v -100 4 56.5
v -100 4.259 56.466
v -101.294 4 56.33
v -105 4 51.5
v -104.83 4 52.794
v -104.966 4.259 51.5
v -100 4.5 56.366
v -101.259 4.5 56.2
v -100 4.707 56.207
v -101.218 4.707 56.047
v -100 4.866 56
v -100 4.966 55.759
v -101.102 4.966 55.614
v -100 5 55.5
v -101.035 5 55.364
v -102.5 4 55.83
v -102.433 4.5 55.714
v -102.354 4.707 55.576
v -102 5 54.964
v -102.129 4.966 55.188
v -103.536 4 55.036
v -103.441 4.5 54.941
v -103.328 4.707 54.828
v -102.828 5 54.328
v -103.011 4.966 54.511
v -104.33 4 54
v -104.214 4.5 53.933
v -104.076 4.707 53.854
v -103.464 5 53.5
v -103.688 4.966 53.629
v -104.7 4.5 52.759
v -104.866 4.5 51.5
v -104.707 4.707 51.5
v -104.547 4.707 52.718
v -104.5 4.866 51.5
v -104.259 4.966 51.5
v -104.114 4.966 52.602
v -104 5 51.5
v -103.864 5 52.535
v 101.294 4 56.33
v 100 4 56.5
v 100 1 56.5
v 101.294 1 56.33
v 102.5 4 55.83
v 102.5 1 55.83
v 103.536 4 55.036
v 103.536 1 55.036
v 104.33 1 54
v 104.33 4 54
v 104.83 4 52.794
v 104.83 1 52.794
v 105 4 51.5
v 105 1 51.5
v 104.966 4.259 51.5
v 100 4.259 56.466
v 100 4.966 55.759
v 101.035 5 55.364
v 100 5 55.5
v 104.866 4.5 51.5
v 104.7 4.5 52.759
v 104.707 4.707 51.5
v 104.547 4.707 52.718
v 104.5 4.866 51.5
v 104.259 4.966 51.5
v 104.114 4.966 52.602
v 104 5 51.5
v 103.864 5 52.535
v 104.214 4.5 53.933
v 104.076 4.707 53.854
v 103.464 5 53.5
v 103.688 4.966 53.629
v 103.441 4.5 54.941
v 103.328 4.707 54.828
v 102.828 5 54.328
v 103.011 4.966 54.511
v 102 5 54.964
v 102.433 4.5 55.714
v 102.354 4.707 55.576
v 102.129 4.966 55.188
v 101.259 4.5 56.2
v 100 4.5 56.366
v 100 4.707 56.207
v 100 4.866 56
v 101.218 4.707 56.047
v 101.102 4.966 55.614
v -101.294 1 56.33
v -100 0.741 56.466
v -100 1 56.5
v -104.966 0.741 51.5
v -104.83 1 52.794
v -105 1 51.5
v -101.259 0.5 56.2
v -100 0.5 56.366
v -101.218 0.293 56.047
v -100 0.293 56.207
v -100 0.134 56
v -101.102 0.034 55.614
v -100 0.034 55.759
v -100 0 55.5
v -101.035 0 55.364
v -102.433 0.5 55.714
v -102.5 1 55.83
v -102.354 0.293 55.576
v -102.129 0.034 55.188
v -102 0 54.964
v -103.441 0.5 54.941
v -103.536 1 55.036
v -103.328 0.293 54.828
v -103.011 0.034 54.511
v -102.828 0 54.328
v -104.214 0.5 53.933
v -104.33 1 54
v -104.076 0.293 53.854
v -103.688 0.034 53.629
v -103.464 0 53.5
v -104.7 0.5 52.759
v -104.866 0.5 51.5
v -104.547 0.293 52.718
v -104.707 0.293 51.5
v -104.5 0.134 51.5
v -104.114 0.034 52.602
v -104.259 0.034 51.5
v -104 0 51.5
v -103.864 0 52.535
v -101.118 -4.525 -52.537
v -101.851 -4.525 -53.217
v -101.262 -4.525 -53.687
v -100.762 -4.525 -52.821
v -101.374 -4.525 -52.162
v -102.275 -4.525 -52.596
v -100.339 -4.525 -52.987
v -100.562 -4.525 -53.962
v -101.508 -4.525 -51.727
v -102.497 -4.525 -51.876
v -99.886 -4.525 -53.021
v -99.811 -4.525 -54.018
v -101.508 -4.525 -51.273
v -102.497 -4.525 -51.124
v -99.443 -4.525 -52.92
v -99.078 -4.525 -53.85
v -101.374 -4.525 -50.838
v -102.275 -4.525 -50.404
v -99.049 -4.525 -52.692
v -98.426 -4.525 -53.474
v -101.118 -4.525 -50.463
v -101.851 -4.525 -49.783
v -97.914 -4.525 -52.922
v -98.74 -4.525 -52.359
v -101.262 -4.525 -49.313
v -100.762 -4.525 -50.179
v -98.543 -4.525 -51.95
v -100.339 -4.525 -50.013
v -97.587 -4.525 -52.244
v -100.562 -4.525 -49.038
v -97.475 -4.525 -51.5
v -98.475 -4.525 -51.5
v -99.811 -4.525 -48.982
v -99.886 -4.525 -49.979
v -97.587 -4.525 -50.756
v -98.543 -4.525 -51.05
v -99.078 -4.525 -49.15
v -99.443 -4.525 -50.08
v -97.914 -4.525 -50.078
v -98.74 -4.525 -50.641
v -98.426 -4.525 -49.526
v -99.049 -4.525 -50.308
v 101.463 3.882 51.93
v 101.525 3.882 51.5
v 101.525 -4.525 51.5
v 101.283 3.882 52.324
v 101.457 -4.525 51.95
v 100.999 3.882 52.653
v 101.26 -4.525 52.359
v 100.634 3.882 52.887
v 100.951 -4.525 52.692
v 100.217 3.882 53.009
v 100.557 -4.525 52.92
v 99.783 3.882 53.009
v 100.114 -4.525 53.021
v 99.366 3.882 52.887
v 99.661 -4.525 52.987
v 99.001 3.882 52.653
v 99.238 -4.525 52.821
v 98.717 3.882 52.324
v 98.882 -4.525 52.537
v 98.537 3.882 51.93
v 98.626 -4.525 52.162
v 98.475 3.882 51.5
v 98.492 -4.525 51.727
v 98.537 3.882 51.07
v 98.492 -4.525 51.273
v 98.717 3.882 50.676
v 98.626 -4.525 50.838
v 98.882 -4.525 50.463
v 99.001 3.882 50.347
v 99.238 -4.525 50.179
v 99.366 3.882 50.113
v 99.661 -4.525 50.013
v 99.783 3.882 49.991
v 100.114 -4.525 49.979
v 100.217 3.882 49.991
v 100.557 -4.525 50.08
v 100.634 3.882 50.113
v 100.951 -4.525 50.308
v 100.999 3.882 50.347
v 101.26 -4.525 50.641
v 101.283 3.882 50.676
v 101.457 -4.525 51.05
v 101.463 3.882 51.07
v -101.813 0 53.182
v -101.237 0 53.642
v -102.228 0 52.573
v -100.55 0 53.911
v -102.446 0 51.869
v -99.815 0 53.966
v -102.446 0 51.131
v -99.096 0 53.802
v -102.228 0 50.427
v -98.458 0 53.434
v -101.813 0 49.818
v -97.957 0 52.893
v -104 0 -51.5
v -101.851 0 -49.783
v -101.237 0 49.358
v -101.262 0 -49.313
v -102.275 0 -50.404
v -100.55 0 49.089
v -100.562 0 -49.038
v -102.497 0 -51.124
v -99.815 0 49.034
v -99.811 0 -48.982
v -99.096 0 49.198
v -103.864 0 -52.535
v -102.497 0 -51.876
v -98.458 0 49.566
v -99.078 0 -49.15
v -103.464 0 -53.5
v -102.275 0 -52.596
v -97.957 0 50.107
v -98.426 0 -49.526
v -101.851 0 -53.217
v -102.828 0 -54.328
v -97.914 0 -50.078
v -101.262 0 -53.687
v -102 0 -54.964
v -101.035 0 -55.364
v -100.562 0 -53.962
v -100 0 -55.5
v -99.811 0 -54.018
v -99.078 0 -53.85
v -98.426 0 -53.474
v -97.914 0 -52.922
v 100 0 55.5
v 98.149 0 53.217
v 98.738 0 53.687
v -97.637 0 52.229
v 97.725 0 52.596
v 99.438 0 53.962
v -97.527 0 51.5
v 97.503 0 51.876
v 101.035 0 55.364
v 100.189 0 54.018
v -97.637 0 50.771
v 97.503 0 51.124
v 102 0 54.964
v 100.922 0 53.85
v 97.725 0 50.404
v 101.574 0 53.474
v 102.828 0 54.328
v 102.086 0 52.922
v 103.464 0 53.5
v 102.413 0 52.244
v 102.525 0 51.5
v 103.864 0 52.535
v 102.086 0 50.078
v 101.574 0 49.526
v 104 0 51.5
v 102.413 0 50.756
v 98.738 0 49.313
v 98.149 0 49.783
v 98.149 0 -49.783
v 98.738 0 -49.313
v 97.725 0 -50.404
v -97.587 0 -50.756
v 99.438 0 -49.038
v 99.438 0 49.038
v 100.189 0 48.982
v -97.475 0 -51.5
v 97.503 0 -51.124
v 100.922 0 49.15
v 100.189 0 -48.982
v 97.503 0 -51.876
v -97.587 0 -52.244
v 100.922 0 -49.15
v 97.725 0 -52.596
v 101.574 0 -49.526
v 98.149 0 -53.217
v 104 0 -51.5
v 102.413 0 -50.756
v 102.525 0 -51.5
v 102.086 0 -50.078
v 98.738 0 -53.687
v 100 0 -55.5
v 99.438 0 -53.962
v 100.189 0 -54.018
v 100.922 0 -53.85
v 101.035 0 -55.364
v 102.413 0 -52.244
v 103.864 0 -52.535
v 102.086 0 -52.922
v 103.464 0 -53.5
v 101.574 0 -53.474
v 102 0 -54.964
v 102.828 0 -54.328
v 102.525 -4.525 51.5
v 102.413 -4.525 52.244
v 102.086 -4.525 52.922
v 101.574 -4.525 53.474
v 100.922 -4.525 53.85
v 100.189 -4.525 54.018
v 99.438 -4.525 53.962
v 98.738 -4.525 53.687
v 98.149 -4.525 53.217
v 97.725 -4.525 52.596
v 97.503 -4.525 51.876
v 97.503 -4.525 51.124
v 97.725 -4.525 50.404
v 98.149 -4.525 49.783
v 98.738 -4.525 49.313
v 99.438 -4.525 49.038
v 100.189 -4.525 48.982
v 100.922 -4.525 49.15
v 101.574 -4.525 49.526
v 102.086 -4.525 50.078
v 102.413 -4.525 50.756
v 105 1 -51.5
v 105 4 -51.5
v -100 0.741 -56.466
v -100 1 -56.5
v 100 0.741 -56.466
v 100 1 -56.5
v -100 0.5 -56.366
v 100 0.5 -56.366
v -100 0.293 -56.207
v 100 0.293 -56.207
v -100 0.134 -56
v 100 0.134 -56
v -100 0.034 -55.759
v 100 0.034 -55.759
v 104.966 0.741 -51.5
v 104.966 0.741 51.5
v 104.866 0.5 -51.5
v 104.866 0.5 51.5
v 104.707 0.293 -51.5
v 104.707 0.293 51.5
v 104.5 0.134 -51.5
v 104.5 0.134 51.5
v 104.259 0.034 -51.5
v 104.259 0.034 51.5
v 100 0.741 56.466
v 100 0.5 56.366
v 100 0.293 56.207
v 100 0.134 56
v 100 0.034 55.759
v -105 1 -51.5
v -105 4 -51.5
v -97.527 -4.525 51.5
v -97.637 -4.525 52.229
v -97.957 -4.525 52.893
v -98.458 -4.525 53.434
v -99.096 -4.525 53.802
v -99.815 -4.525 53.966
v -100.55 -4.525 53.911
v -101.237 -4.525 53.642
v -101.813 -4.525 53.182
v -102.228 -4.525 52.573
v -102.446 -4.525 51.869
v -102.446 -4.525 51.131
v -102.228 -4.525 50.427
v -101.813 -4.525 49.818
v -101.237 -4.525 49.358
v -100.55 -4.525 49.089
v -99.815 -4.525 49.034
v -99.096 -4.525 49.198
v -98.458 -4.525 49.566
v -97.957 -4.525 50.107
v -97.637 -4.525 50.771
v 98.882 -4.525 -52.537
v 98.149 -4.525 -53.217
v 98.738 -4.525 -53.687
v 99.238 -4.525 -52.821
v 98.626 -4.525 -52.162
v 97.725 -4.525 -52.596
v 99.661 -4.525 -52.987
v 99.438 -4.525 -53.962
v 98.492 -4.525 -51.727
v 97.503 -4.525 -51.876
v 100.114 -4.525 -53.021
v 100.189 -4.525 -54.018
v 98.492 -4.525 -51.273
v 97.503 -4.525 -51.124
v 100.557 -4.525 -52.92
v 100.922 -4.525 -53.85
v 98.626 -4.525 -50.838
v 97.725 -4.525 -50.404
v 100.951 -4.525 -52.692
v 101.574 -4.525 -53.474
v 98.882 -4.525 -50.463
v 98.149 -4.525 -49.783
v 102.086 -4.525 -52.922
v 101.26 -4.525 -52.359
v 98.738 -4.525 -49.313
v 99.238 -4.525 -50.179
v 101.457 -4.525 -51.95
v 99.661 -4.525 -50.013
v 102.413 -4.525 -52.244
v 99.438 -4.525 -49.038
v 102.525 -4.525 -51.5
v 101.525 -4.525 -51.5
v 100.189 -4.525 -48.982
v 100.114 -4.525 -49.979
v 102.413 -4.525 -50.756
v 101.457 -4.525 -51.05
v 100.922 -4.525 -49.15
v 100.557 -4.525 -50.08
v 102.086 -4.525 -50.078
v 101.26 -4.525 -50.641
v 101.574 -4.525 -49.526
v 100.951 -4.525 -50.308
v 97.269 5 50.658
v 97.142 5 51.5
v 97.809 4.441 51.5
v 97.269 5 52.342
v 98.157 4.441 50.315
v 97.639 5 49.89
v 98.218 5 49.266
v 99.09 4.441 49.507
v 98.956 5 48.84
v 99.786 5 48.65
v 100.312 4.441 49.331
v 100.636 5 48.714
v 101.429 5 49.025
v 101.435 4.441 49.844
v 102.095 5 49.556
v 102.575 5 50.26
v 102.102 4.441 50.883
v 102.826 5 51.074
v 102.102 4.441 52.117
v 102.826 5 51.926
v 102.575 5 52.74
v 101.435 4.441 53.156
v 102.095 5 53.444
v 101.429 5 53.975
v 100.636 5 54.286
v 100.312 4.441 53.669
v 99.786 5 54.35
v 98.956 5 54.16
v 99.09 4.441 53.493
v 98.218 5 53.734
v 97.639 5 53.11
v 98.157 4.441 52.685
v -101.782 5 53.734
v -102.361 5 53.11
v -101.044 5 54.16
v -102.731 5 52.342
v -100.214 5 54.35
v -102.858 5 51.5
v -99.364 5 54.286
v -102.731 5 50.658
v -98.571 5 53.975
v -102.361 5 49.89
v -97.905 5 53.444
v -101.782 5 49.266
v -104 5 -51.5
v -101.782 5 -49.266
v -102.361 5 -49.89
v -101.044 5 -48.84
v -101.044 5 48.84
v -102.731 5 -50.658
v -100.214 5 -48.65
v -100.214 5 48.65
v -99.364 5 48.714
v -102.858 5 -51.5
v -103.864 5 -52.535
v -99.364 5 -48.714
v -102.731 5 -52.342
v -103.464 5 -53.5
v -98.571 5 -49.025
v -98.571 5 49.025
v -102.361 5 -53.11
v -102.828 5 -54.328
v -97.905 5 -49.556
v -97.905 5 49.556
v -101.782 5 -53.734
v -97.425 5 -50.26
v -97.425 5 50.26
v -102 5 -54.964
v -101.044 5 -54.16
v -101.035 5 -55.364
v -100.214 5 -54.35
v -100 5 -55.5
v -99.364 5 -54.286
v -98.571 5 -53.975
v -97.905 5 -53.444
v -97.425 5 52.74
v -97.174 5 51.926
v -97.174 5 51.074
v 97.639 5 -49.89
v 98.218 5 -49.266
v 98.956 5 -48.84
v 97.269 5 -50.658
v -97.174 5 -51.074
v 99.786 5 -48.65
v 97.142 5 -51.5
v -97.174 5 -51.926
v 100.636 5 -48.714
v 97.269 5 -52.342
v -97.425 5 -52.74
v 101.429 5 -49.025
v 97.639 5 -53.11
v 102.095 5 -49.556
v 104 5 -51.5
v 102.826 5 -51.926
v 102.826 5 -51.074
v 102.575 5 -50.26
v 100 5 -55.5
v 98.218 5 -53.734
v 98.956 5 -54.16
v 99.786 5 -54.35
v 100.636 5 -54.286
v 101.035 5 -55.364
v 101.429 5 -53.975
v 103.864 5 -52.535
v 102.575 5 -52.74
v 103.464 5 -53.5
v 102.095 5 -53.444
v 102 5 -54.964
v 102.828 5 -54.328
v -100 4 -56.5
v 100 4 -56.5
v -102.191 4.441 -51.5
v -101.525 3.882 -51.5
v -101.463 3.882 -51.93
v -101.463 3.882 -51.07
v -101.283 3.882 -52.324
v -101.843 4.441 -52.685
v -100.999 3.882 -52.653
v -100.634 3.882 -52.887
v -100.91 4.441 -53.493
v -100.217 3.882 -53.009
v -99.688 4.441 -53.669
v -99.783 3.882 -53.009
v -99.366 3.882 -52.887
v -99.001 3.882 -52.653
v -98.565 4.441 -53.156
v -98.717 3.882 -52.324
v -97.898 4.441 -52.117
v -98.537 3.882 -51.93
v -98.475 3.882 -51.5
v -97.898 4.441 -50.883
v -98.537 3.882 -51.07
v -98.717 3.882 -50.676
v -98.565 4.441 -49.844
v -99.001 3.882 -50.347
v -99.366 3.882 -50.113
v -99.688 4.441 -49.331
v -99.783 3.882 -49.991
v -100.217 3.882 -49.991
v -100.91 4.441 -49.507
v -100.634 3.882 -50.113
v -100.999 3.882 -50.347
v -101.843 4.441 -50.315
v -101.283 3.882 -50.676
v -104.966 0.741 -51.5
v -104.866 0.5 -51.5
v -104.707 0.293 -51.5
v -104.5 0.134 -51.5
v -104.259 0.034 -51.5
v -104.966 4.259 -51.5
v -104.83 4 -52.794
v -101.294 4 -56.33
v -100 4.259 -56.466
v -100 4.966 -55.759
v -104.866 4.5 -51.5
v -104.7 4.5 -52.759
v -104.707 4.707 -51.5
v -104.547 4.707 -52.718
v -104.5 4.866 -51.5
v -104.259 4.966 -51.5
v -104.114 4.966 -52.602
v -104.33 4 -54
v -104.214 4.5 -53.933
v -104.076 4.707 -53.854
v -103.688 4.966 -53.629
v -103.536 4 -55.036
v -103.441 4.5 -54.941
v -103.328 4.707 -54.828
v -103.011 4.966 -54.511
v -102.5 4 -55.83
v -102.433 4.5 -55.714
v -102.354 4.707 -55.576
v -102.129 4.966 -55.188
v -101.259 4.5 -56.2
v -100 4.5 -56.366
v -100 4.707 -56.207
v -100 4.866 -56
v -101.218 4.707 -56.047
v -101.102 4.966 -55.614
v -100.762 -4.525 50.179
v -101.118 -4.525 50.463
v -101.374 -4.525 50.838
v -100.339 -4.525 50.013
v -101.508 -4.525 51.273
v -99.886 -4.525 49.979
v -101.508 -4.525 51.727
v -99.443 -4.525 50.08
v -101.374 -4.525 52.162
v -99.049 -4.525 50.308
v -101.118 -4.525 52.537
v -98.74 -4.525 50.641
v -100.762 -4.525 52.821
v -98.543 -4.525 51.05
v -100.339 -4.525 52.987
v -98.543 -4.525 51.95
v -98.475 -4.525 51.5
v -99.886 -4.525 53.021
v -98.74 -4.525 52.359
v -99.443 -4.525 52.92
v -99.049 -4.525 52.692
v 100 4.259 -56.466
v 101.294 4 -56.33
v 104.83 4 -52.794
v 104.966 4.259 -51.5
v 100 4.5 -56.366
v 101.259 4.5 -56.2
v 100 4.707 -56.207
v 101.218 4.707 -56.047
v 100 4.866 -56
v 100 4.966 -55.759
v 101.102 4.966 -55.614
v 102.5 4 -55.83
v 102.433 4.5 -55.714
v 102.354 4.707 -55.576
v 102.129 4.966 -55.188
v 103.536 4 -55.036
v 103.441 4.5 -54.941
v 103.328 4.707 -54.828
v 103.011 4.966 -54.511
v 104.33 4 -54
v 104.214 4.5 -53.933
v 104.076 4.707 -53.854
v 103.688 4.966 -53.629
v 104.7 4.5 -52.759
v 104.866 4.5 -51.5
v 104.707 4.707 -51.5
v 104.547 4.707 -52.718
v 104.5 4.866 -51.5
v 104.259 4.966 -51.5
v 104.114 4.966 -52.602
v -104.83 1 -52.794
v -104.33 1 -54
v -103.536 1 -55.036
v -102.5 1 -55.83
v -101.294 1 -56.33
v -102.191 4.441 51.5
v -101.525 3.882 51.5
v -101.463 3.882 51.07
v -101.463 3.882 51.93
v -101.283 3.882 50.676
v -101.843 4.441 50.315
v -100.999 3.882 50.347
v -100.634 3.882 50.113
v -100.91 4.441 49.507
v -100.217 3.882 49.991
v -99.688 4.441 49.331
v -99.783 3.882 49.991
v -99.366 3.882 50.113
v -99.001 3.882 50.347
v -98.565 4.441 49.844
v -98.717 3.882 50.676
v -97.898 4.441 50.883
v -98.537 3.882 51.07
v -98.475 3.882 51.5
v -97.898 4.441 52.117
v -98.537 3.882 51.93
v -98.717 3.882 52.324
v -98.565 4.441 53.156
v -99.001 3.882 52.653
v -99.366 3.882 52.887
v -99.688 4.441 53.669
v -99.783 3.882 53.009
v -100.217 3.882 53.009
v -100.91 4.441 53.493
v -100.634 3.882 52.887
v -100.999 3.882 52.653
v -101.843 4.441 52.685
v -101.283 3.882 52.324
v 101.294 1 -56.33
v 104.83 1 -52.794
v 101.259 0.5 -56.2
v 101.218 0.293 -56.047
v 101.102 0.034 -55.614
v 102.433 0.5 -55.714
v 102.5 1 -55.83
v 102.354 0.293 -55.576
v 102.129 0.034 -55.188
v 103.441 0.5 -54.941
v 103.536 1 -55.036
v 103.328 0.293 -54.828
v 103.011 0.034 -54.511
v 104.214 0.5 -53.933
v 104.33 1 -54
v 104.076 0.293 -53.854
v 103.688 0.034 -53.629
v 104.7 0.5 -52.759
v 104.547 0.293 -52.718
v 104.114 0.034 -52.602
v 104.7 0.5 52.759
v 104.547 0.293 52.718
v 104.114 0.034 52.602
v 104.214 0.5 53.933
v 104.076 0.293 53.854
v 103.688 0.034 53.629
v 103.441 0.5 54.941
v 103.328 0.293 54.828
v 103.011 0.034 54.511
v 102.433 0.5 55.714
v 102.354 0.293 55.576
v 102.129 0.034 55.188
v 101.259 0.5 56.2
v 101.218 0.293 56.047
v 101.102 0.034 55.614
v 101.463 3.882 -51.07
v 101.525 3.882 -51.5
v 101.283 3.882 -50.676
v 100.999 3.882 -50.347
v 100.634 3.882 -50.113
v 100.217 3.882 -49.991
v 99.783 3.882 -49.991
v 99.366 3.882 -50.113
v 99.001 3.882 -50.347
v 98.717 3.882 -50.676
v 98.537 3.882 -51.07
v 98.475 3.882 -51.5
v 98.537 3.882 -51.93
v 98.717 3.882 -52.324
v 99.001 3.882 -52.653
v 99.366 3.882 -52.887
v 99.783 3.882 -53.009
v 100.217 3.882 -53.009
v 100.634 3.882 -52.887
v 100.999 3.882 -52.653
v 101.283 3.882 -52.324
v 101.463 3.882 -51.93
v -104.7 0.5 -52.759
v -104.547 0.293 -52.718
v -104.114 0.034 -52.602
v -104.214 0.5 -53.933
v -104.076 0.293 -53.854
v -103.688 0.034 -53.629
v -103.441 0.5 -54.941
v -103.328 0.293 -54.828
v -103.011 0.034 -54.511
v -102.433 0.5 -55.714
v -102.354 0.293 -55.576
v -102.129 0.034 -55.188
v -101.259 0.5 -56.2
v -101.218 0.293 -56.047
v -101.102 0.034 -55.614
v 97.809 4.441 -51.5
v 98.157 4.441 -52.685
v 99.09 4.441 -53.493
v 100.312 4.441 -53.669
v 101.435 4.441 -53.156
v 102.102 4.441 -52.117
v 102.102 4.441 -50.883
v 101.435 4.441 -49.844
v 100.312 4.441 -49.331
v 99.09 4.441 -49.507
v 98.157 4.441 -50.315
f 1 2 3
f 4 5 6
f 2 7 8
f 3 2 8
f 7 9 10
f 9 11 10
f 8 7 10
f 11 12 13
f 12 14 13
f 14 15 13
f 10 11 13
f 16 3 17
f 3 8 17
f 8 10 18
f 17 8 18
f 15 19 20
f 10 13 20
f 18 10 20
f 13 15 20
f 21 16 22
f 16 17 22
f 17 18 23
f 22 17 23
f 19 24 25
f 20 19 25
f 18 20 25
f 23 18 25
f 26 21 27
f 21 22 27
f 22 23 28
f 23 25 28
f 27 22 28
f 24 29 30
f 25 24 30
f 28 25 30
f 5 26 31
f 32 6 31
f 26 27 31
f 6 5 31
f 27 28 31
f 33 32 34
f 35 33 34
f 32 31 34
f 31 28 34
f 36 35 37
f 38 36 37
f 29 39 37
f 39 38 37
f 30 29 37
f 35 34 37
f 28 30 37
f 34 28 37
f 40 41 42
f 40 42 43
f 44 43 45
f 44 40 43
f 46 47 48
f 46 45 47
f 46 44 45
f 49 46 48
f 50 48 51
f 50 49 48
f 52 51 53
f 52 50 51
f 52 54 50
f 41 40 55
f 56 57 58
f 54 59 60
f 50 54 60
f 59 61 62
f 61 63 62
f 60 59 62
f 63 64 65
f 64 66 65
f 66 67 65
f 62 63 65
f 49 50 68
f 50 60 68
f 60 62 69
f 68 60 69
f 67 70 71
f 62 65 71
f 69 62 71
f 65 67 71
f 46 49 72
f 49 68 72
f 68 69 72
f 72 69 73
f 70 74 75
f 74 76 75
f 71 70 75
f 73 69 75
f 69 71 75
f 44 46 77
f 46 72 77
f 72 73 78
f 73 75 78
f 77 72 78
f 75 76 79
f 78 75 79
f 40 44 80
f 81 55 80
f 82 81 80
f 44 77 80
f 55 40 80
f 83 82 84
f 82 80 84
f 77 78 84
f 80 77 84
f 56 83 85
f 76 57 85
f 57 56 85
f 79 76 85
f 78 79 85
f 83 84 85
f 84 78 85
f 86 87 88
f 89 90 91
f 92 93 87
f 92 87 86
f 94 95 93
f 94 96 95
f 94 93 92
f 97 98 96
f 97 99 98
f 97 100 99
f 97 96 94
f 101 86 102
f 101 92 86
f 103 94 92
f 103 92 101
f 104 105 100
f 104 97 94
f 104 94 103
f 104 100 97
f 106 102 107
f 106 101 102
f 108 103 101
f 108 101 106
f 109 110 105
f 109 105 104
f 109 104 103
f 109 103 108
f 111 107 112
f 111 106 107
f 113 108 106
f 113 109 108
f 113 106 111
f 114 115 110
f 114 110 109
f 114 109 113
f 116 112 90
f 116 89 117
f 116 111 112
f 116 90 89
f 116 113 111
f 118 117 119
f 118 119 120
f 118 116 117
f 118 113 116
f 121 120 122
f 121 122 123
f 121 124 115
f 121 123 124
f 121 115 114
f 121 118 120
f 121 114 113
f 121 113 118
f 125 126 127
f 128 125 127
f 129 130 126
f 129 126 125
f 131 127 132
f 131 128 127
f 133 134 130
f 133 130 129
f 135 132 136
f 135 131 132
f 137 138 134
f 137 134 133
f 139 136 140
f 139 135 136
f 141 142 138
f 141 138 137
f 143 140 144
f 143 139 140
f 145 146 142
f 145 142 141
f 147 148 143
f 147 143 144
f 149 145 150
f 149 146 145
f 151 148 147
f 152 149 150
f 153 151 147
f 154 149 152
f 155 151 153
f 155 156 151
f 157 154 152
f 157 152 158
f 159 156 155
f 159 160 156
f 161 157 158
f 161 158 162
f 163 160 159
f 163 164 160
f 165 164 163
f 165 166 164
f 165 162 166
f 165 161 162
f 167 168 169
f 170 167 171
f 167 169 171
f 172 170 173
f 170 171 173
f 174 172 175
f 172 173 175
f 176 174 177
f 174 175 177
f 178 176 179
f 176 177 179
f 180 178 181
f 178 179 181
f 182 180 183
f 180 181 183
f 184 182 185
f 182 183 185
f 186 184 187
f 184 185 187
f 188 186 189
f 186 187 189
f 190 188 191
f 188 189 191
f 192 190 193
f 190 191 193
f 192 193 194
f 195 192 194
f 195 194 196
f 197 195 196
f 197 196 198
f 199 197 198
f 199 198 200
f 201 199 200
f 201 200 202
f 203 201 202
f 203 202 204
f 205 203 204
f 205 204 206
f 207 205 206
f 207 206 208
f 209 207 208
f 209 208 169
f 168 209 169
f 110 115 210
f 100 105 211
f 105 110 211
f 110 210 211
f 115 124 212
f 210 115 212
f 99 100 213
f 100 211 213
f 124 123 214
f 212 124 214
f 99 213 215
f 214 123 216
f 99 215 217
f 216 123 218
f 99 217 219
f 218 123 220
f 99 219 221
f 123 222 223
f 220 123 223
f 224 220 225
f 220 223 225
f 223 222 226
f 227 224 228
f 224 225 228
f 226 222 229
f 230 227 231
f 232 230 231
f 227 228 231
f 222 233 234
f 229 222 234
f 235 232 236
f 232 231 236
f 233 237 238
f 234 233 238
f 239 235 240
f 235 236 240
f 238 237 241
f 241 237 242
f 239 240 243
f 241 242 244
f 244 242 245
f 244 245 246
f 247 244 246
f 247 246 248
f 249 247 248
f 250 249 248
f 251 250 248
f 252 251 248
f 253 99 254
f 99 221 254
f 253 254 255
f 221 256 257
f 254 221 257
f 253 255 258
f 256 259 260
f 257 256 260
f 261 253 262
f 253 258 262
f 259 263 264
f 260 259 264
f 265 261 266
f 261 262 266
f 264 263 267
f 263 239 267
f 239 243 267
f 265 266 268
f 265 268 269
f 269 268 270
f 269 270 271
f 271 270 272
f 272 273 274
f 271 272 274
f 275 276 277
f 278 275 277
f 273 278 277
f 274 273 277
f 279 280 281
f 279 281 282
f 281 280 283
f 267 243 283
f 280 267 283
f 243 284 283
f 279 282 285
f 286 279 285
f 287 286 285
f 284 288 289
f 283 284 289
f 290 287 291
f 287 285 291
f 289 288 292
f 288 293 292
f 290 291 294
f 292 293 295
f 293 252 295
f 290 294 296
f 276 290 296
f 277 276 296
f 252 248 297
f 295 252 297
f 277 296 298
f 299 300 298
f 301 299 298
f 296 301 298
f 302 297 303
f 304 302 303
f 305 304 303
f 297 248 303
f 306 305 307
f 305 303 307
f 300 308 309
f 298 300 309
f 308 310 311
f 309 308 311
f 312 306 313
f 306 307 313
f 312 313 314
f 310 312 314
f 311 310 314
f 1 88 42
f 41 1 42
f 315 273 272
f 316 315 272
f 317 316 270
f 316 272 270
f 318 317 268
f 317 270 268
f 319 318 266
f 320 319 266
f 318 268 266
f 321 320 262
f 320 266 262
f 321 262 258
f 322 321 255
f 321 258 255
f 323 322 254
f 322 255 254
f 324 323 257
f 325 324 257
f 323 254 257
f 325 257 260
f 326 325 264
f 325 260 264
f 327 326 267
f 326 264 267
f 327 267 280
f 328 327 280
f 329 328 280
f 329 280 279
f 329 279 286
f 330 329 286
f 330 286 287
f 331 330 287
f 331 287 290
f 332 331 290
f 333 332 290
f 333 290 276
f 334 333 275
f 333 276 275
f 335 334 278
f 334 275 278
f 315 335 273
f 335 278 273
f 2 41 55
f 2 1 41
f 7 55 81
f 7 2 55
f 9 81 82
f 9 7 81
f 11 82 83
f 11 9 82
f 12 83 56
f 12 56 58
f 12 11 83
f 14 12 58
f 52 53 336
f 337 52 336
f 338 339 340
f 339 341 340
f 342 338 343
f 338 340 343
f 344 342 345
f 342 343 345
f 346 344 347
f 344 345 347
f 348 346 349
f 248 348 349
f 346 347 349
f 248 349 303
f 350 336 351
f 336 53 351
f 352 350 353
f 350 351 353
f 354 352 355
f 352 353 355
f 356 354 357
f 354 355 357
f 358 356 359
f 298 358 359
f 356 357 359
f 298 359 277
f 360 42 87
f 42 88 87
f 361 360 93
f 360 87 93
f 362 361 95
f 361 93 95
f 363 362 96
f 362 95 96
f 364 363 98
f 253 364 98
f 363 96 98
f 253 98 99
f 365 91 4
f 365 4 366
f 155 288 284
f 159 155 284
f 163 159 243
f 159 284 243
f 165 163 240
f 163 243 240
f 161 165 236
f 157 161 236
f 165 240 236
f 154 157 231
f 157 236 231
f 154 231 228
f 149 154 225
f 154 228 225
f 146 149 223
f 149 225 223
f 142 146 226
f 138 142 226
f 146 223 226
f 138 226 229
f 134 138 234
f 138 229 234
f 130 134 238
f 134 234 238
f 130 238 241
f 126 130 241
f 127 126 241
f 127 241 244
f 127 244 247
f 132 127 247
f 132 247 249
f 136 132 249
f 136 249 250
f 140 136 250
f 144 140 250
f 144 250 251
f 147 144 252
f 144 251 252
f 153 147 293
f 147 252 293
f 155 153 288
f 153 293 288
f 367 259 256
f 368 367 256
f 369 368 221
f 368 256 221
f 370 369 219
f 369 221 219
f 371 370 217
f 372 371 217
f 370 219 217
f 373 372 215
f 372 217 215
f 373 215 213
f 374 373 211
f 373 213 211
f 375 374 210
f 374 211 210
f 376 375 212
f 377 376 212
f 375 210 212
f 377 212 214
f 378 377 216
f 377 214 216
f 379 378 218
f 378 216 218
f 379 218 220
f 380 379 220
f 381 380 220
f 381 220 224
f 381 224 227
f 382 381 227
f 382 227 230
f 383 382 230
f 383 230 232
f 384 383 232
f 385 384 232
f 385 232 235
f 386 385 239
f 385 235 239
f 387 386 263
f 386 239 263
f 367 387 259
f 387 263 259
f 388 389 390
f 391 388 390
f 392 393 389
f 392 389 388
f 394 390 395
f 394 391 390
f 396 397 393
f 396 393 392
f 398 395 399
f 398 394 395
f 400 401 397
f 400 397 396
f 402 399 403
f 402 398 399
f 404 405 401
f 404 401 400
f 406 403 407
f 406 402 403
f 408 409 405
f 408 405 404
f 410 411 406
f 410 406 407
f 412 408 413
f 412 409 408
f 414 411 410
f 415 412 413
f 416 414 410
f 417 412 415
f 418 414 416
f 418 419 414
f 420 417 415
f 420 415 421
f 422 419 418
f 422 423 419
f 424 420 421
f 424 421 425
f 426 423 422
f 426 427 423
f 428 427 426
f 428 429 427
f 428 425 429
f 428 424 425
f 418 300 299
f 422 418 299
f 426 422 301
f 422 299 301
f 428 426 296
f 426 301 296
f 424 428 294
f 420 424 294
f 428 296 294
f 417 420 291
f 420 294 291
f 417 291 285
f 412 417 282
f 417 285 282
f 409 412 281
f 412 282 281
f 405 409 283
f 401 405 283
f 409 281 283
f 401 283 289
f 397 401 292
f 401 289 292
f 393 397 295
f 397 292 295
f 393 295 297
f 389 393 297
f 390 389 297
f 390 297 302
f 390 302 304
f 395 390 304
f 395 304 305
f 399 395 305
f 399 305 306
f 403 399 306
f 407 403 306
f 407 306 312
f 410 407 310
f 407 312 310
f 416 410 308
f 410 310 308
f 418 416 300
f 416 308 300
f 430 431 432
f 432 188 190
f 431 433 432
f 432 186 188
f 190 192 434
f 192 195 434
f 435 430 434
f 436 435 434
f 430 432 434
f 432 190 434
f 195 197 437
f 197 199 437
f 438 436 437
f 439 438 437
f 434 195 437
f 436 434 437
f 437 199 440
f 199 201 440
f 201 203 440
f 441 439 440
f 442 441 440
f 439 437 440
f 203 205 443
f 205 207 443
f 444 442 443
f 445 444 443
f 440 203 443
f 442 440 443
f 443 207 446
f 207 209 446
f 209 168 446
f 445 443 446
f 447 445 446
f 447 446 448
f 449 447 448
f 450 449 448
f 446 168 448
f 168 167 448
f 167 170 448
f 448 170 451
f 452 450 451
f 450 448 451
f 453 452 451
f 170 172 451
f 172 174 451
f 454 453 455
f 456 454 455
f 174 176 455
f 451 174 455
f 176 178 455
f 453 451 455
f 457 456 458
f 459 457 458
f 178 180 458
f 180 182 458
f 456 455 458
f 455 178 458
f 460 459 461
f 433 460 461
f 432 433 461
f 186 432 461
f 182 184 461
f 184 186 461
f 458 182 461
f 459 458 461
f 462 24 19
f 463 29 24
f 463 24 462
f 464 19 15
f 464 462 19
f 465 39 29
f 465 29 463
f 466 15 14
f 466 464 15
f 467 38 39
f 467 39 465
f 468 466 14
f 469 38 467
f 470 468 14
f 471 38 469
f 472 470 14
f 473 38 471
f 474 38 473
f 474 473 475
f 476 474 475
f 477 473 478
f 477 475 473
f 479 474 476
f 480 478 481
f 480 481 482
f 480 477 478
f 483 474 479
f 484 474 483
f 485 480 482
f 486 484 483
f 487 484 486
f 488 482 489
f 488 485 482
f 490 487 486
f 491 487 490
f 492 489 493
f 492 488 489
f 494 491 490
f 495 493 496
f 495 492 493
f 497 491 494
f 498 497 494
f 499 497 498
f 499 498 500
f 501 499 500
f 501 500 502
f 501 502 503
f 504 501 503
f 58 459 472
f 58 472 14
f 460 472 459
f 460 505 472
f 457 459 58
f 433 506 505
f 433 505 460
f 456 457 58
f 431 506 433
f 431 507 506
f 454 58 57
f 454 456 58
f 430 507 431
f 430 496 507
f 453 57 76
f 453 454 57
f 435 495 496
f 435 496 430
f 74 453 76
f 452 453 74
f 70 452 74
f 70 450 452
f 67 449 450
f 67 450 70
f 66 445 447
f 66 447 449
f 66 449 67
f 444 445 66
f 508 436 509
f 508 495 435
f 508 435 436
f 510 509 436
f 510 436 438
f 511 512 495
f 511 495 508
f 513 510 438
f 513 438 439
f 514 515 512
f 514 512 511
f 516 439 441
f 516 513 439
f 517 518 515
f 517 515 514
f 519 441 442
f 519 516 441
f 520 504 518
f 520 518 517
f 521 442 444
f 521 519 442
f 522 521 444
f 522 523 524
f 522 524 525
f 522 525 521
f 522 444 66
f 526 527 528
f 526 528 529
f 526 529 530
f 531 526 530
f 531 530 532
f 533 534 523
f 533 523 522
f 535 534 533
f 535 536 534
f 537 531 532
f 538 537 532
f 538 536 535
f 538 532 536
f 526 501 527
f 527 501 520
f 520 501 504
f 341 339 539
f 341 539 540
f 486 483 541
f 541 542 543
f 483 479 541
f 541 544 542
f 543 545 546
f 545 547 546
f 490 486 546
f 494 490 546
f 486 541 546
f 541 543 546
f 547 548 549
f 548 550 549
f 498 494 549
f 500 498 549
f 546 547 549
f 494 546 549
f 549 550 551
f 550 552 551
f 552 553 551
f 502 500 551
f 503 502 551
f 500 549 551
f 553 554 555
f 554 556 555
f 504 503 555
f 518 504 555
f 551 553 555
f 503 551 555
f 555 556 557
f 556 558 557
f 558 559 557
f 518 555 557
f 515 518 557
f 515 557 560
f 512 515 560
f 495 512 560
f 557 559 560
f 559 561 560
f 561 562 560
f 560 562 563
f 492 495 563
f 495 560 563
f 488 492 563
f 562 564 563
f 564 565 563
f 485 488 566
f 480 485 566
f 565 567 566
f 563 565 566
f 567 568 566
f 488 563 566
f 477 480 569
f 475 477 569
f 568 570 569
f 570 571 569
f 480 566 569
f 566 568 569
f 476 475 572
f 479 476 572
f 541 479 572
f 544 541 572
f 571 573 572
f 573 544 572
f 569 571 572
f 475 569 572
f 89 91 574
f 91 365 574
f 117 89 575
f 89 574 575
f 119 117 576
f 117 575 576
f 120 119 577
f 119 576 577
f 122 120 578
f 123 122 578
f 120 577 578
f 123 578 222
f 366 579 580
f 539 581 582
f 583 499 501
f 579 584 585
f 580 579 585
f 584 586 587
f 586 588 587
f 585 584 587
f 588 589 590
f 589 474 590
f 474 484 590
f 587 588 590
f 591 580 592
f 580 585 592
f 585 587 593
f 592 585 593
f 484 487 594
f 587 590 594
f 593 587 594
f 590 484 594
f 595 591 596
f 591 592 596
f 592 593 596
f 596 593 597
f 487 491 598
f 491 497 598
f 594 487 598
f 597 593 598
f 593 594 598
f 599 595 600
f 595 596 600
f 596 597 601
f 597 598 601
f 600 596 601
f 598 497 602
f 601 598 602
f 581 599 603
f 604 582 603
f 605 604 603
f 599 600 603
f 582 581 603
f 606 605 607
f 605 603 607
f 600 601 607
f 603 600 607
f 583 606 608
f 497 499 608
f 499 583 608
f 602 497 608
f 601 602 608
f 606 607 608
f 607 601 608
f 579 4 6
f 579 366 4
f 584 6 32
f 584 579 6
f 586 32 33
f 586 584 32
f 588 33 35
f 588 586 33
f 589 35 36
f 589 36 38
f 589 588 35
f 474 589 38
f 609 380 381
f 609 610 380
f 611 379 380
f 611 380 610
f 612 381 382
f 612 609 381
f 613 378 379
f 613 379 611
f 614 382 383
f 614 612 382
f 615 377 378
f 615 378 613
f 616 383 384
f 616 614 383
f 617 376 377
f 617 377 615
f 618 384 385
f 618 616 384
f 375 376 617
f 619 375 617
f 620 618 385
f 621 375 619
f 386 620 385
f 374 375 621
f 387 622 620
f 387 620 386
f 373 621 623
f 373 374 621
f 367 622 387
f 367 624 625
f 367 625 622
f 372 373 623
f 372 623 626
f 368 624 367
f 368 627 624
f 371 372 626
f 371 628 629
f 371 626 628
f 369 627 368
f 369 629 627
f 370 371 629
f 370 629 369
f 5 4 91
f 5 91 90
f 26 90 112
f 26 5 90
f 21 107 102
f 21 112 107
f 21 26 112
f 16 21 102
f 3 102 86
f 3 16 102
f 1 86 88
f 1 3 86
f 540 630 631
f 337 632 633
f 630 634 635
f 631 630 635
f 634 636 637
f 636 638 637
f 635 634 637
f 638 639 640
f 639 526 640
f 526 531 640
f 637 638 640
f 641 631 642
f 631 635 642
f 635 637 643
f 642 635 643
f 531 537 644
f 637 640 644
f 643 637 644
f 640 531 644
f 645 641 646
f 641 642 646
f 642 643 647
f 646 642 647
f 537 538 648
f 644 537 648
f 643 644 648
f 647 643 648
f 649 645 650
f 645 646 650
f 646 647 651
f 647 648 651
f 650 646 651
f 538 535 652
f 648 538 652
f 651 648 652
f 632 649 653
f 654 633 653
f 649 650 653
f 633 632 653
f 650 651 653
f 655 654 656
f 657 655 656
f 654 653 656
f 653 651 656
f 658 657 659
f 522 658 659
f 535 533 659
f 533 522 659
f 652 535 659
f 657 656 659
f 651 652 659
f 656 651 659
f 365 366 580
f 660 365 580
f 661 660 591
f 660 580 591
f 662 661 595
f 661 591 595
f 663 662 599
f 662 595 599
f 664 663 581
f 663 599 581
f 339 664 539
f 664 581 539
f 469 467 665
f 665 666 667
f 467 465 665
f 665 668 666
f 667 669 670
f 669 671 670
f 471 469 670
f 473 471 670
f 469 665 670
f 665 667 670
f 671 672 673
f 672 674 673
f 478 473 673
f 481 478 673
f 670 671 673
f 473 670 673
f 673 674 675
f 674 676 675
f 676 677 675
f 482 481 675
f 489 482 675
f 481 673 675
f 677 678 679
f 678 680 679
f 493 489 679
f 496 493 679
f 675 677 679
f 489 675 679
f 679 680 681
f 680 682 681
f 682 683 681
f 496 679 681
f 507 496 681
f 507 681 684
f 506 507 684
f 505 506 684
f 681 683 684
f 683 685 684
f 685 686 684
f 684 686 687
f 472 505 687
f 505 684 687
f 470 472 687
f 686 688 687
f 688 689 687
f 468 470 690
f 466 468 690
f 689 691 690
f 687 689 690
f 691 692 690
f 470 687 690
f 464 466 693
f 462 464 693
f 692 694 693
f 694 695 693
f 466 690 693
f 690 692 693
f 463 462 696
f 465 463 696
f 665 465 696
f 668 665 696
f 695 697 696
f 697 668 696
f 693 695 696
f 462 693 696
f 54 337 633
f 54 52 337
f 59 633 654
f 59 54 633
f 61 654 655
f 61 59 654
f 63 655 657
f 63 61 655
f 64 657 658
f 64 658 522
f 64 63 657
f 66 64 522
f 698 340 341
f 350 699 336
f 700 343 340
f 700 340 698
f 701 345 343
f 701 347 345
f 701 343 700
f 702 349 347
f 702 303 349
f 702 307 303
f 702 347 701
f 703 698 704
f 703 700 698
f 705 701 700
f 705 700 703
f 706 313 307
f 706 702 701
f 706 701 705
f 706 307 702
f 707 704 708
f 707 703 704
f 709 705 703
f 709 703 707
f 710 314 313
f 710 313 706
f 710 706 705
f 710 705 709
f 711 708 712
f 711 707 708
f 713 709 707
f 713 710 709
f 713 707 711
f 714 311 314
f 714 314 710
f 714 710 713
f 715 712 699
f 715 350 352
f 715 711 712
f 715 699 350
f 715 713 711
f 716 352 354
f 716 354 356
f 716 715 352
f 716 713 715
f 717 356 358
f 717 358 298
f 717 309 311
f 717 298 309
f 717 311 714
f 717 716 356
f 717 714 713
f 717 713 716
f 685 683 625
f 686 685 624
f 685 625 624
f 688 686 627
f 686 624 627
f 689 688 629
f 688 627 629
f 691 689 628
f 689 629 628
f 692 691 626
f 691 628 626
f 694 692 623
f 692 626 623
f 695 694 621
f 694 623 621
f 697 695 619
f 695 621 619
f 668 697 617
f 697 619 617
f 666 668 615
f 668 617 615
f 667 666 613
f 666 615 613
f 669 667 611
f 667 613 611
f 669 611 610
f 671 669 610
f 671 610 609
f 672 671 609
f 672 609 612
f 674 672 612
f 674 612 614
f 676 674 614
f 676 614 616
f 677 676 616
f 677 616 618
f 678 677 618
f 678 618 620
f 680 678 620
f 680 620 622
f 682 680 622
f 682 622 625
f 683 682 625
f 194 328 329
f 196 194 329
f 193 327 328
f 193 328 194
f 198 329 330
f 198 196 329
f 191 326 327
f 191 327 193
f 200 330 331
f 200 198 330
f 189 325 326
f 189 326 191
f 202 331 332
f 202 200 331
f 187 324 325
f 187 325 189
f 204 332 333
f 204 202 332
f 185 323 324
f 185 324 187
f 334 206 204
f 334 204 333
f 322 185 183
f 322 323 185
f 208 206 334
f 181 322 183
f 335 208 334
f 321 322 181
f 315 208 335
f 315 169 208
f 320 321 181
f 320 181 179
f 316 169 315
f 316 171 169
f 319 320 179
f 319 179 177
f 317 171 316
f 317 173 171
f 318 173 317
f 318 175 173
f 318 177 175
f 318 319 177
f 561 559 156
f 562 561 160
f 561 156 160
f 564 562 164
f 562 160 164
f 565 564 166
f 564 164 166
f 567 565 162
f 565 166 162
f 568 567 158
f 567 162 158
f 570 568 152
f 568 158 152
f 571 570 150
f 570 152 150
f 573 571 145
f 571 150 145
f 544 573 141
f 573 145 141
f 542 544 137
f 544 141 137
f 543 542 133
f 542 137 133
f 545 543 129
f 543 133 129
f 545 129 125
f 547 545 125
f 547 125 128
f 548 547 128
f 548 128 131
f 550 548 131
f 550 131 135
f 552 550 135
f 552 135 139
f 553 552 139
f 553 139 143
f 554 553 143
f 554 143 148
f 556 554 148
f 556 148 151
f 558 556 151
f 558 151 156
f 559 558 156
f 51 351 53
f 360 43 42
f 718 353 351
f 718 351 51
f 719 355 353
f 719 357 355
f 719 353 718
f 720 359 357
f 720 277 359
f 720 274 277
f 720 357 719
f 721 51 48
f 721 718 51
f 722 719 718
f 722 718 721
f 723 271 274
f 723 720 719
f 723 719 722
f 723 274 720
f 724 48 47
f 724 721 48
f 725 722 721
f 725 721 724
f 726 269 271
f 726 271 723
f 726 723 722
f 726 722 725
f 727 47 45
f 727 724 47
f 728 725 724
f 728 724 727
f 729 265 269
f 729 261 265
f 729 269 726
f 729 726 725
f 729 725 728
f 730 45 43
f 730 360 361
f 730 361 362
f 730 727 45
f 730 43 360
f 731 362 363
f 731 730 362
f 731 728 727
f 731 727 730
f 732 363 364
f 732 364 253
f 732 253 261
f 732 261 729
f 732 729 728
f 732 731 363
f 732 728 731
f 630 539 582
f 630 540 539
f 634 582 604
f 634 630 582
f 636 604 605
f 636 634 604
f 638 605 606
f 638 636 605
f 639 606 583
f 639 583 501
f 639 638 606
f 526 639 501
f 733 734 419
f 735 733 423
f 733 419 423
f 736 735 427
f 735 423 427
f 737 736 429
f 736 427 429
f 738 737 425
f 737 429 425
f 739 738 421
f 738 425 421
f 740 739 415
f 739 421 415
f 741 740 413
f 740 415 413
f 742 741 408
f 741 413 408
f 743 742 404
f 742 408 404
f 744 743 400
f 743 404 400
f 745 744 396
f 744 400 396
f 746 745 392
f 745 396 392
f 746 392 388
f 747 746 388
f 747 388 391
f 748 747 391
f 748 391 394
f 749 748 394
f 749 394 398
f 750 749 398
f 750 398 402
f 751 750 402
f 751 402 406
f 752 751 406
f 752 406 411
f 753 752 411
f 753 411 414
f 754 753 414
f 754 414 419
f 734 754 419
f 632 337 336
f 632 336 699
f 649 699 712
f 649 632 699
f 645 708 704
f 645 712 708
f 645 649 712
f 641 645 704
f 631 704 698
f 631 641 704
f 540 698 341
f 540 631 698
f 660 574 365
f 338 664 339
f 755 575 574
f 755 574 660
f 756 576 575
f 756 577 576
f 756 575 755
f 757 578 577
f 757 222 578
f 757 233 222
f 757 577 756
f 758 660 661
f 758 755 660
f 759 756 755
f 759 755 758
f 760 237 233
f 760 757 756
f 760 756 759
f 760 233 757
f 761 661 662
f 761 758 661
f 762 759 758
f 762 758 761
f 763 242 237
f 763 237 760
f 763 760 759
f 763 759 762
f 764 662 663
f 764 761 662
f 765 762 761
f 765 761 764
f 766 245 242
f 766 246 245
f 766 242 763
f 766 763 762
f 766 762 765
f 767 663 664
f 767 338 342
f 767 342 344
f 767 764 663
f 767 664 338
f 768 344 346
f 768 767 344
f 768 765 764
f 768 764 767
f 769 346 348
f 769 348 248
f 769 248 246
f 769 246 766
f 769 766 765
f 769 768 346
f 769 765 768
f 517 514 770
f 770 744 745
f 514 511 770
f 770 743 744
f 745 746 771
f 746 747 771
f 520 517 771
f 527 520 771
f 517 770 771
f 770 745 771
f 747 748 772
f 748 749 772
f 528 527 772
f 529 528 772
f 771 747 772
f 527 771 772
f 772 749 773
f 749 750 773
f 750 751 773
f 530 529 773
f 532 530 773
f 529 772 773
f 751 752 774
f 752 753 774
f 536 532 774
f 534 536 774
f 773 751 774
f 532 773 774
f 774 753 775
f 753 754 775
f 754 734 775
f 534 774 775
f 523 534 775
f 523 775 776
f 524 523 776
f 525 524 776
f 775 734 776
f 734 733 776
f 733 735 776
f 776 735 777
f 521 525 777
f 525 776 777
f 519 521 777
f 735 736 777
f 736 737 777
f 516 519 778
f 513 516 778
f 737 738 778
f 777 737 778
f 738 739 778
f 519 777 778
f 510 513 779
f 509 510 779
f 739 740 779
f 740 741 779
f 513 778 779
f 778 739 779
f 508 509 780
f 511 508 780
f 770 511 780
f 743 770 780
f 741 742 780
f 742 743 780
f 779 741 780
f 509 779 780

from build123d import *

# Parameters (mm, degrees)
SKETCH1_W                                         = 210
SKETCH1_H                                         = 113
BOSS_EXTRUDE1_DEPTH                               = 5
FILLET1_R                                         = 5
FILLET2_R                                         = 1
CSK_FOR_4_FLAT_HEAD_MACHINE_SCREW_100_D           = 2.9464
CSK_FOR_4_FLAT_HEAD_MACHINE_SCREW_100_CSINK_D     = 5.715
CSK_FOR_4_FLAT_HEAD_MACHINE_SCREW_100_CSINK_ANGLE = 100
SKETCH8_R                                         = 2.4732
BOSS_EXTRUDE2_DEPTH                               = 4.525
SKETCH10_R                                        = 1.525
CUT_EXTRUDE1_DEPTH                                = 1
CUT_EXTRUDE1_DEPTH_BACK                           = 10.525
SKETCH11_R                                        = 2.525
BOSS_EXTRUDE3_DEPTH                               = 4.525
SKETCH14_R                                        = 1.525
CUT_EXTRUDE2_DEPTH                                = 10.5250001
SKETCH15_R                                        = 2.525
BOSS_EXTRUDE6_DEPTH                               = 4.525
SKETCH16_R                                        = 1.525
CUT_EXTRUDE3_DEPTH                                = 10.5250001
SKETCH17_R                                        = 2.525
BOSS_EXTRUDE7_DEPTH                               = 4.525
SKETCH18_R                                        = 1.525
CUT_EXTRUDE4_DEPTH                                = 10.5250001


with BuildPart() as part:
    # Sketch1 → Boss-Extrude1 (new body)
    with BuildSketch(Plane(origin=(0, 0, 0), x_dir=(1, 0, 0), z_dir=(0, 1, 0))):
        Rectangle(SKETCH1_W, SKETCH1_H)
    extrude(amount=BOSS_EXTRUDE1_DEPTH)

    # Fillet1
    fillet1_edges = [part.edges().sort_by_distance(p)[0] for p in [
        (105, 2.5, 56.5),
        (-105, 2.5, 56.5),
        (-105, 2.5, -56.5),
        (105, 2.5, -56.5),
    ]]
    fillet(fillet1_edges, radius=FILLET1_R)

    # Fillet2
    fillet2_edges = [part.edges().sort_by_distance(p)[0] for p in [
        (-105, 0, 0),
        (-105, 5, 0),
        (105, 0, 0),
        (0, 0, 56.5),
        (0, 0, -56.5),
        (103.535533906, 0, -55.035533906),
        (103.535533906, 0, 55.035533906),
        (-103.535533906, 0, 55.035533906),
        (-103.535533906, 0, -55.035533906),
        (0, 5, -56.5),
        (105, 5, 0),
        (0, 5, 56.5),
        (103.535533906, 5, -55.035533906),
        (103.535533906, 5, 55.035533906),
        (-103.535533906, 5, 55.035533906),
        (-103.535533906, 5, -55.035533906),
    ]]
    fillet(fillet2_edges, radius=FILLET2_R)

    # CSK for #4 Flat Head Machine Screw (100)1 (through all)
    with Locations(Plane(origin=(0, 5, 0), x_dir=(1, 0, 0), z_dir=(0, 1, 0))):
        with Locations((-100, -51.5), (100, 51.5), (100, -51.5), (-100, 51.5)):
            CounterSinkHole(CSK_FOR_4_FLAT_HEAD_MACHINE_SCREW_100_D / 2, CSK_FOR_4_FLAT_HEAD_MACHINE_SCREW_100_CSINK_D / 2, counter_sink_angle=CSK_FOR_4_FLAT_HEAD_MACHINE_SCREW_100_CSINK_ANGLE)

    # Sketch8 → Boss-Extrude2 (add)
    with BuildSketch(Plane.XZ):
        with Locations((-100, 51.5)):
            Circle(SKETCH8_R)
    extrude(amount=BOSS_EXTRUDE2_DEPTH)

    # Sketch10 → Cut-Extrude1 (cut, two sides)
    with BuildSketch(Plane.XZ.offset(4.525)) as cut_extrude1_sk:
        with Locations((-100, 51.5)):
            Circle(SKETCH10_R)
    extrude(amount=CUT_EXTRUDE1_DEPTH, mode=Mode.SUBTRACT)
    extrude(cut_extrude1_sk.sketch, amount=-CUT_EXTRUDE1_DEPTH_BACK, mode=Mode.SUBTRACT)

    # Sketch11 → Boss-Extrude3 (add)
    with BuildSketch(Plane.XZ):
        with Locations((-100, -51.5)):
            Circle(SKETCH11_R)
    extrude(amount=BOSS_EXTRUDE3_DEPTH)

    # Sketch14 → Cut-Extrude2 (cut, through all)
    with BuildSketch(Plane.XZ.offset(4.525)):
        with Locations((-100, -51.5)):
            Circle(SKETCH14_R)
    extrude(amount=-CUT_EXTRUDE2_DEPTH, mode=Mode.SUBTRACT)

    # Sketch15 → Boss-Extrude6 (add)
    with BuildSketch(Plane.XZ):
        with Locations((100, 51.5)):
            Circle(SKETCH15_R)
    extrude(amount=BOSS_EXTRUDE6_DEPTH)

    # Sketch16 → Cut-Extrude3 (cut, through all)
    with BuildSketch(Plane.XZ.offset(4.525)):
        with Locations((100, 51.5)):
            Circle(SKETCH16_R)
    extrude(amount=-CUT_EXTRUDE3_DEPTH, mode=Mode.SUBTRACT)

    # Sketch17 → Boss-Extrude7 (add)
    with BuildSketch(Plane.XZ):
        with Locations((100, -51.5)):
            Circle(SKETCH17_R)
    extrude(amount=BOSS_EXTRUDE7_DEPTH)

    # Sketch18 → Cut-Extrude4 (cut, through all)
    with BuildSketch(Plane.XZ.offset(4.525)):
        with Locations((100, -51.5)):
            Circle(SKETCH18_R)
    extrude(amount=-CUT_EXTRUDE4_DEPTH, mode=Mode.SUBTRACT)


solid = part.part
